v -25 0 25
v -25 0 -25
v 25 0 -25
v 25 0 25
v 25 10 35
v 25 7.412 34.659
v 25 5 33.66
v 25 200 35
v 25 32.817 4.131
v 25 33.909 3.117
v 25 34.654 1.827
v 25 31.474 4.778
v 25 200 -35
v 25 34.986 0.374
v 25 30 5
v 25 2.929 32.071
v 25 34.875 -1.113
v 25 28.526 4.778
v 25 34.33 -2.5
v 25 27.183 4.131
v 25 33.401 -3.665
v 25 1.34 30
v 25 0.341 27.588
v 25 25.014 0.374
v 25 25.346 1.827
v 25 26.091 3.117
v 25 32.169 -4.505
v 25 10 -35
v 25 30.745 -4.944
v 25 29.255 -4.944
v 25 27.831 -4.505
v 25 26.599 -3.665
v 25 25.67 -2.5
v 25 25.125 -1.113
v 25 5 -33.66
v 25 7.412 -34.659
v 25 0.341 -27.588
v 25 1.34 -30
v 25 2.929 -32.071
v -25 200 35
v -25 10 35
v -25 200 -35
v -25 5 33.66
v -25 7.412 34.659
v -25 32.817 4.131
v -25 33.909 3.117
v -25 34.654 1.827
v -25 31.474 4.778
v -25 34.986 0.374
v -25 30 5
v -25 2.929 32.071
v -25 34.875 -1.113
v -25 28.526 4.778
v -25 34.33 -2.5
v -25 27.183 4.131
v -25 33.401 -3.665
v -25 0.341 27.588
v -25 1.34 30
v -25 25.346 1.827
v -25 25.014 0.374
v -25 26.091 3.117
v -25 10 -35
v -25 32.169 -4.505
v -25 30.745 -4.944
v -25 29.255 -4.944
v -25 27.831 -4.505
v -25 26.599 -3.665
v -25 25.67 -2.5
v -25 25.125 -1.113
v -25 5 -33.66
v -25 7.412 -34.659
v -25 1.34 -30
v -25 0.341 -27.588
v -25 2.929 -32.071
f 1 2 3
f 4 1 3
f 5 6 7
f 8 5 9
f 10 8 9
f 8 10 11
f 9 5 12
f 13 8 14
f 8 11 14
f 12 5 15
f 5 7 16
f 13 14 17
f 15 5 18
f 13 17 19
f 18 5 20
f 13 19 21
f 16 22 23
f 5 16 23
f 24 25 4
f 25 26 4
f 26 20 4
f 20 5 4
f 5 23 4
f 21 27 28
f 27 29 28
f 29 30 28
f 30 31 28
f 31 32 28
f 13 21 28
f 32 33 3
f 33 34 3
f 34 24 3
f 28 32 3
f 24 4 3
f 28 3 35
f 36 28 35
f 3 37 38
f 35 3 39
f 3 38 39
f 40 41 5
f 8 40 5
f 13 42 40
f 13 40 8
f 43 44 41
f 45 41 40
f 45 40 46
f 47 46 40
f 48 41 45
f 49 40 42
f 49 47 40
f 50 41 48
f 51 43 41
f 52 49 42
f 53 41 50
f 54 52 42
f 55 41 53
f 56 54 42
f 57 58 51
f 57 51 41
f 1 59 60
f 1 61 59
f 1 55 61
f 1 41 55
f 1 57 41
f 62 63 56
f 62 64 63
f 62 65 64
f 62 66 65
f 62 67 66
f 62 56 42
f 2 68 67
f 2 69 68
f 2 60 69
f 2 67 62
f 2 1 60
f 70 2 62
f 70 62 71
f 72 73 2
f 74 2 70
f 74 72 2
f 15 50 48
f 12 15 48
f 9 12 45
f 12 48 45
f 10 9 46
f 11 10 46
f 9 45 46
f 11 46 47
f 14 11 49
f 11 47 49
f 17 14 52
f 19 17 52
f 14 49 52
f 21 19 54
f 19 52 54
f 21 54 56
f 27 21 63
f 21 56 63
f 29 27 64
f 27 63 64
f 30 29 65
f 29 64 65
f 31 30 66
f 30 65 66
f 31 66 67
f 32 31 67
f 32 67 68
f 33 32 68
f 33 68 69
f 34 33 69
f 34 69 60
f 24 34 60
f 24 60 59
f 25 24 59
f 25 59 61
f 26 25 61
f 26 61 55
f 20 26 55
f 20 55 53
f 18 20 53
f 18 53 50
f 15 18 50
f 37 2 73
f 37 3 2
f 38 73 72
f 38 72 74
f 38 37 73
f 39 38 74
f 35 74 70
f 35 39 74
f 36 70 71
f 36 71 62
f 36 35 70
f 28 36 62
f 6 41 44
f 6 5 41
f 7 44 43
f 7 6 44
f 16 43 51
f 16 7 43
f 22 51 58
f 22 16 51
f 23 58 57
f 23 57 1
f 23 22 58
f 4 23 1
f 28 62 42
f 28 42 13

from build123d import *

# Parameters (mm, degrees)
SKETCH1_W           = 50
SKETCH1_H           = 70
BOSS_EXTRUDE1_DEPTH = 200
SKETCH2_R           = 5
CUT_EXTRUDE1_DEPTH  = 200
FILLET1_R           = 10


with BuildPart() as part:
    # Sketch1 → Boss-Extrude1 (new body)
    with BuildSketch(Plane(origin=(0, 0, 0), x_dir=(1, 0, 0), z_dir=(0, 1, 0))):
        Rectangle(SKETCH1_W, SKETCH1_H)
    extrude(amount=BOSS_EXTRUDE1_DEPTH)

    # Sketch2 → Cut-Extrude1 (cut)
    with BuildSketch(Plane.ZY.offset(25)):
        with Locations((0, 30)):
            Circle(SKETCH2_R)
    extrude(amount=-CUT_EXTRUDE1_DEPTH, mode=Mode.SUBTRACT)

    # Fillet1
    fillet1_edges = [part.edges().sort_by_distance(p)[0] for p in [
        (0, 0, 35),
        (0, 0, -35),
    ]]
    fillet(fillet1_edges, radius=FILLET1_R)


solid = part.part
